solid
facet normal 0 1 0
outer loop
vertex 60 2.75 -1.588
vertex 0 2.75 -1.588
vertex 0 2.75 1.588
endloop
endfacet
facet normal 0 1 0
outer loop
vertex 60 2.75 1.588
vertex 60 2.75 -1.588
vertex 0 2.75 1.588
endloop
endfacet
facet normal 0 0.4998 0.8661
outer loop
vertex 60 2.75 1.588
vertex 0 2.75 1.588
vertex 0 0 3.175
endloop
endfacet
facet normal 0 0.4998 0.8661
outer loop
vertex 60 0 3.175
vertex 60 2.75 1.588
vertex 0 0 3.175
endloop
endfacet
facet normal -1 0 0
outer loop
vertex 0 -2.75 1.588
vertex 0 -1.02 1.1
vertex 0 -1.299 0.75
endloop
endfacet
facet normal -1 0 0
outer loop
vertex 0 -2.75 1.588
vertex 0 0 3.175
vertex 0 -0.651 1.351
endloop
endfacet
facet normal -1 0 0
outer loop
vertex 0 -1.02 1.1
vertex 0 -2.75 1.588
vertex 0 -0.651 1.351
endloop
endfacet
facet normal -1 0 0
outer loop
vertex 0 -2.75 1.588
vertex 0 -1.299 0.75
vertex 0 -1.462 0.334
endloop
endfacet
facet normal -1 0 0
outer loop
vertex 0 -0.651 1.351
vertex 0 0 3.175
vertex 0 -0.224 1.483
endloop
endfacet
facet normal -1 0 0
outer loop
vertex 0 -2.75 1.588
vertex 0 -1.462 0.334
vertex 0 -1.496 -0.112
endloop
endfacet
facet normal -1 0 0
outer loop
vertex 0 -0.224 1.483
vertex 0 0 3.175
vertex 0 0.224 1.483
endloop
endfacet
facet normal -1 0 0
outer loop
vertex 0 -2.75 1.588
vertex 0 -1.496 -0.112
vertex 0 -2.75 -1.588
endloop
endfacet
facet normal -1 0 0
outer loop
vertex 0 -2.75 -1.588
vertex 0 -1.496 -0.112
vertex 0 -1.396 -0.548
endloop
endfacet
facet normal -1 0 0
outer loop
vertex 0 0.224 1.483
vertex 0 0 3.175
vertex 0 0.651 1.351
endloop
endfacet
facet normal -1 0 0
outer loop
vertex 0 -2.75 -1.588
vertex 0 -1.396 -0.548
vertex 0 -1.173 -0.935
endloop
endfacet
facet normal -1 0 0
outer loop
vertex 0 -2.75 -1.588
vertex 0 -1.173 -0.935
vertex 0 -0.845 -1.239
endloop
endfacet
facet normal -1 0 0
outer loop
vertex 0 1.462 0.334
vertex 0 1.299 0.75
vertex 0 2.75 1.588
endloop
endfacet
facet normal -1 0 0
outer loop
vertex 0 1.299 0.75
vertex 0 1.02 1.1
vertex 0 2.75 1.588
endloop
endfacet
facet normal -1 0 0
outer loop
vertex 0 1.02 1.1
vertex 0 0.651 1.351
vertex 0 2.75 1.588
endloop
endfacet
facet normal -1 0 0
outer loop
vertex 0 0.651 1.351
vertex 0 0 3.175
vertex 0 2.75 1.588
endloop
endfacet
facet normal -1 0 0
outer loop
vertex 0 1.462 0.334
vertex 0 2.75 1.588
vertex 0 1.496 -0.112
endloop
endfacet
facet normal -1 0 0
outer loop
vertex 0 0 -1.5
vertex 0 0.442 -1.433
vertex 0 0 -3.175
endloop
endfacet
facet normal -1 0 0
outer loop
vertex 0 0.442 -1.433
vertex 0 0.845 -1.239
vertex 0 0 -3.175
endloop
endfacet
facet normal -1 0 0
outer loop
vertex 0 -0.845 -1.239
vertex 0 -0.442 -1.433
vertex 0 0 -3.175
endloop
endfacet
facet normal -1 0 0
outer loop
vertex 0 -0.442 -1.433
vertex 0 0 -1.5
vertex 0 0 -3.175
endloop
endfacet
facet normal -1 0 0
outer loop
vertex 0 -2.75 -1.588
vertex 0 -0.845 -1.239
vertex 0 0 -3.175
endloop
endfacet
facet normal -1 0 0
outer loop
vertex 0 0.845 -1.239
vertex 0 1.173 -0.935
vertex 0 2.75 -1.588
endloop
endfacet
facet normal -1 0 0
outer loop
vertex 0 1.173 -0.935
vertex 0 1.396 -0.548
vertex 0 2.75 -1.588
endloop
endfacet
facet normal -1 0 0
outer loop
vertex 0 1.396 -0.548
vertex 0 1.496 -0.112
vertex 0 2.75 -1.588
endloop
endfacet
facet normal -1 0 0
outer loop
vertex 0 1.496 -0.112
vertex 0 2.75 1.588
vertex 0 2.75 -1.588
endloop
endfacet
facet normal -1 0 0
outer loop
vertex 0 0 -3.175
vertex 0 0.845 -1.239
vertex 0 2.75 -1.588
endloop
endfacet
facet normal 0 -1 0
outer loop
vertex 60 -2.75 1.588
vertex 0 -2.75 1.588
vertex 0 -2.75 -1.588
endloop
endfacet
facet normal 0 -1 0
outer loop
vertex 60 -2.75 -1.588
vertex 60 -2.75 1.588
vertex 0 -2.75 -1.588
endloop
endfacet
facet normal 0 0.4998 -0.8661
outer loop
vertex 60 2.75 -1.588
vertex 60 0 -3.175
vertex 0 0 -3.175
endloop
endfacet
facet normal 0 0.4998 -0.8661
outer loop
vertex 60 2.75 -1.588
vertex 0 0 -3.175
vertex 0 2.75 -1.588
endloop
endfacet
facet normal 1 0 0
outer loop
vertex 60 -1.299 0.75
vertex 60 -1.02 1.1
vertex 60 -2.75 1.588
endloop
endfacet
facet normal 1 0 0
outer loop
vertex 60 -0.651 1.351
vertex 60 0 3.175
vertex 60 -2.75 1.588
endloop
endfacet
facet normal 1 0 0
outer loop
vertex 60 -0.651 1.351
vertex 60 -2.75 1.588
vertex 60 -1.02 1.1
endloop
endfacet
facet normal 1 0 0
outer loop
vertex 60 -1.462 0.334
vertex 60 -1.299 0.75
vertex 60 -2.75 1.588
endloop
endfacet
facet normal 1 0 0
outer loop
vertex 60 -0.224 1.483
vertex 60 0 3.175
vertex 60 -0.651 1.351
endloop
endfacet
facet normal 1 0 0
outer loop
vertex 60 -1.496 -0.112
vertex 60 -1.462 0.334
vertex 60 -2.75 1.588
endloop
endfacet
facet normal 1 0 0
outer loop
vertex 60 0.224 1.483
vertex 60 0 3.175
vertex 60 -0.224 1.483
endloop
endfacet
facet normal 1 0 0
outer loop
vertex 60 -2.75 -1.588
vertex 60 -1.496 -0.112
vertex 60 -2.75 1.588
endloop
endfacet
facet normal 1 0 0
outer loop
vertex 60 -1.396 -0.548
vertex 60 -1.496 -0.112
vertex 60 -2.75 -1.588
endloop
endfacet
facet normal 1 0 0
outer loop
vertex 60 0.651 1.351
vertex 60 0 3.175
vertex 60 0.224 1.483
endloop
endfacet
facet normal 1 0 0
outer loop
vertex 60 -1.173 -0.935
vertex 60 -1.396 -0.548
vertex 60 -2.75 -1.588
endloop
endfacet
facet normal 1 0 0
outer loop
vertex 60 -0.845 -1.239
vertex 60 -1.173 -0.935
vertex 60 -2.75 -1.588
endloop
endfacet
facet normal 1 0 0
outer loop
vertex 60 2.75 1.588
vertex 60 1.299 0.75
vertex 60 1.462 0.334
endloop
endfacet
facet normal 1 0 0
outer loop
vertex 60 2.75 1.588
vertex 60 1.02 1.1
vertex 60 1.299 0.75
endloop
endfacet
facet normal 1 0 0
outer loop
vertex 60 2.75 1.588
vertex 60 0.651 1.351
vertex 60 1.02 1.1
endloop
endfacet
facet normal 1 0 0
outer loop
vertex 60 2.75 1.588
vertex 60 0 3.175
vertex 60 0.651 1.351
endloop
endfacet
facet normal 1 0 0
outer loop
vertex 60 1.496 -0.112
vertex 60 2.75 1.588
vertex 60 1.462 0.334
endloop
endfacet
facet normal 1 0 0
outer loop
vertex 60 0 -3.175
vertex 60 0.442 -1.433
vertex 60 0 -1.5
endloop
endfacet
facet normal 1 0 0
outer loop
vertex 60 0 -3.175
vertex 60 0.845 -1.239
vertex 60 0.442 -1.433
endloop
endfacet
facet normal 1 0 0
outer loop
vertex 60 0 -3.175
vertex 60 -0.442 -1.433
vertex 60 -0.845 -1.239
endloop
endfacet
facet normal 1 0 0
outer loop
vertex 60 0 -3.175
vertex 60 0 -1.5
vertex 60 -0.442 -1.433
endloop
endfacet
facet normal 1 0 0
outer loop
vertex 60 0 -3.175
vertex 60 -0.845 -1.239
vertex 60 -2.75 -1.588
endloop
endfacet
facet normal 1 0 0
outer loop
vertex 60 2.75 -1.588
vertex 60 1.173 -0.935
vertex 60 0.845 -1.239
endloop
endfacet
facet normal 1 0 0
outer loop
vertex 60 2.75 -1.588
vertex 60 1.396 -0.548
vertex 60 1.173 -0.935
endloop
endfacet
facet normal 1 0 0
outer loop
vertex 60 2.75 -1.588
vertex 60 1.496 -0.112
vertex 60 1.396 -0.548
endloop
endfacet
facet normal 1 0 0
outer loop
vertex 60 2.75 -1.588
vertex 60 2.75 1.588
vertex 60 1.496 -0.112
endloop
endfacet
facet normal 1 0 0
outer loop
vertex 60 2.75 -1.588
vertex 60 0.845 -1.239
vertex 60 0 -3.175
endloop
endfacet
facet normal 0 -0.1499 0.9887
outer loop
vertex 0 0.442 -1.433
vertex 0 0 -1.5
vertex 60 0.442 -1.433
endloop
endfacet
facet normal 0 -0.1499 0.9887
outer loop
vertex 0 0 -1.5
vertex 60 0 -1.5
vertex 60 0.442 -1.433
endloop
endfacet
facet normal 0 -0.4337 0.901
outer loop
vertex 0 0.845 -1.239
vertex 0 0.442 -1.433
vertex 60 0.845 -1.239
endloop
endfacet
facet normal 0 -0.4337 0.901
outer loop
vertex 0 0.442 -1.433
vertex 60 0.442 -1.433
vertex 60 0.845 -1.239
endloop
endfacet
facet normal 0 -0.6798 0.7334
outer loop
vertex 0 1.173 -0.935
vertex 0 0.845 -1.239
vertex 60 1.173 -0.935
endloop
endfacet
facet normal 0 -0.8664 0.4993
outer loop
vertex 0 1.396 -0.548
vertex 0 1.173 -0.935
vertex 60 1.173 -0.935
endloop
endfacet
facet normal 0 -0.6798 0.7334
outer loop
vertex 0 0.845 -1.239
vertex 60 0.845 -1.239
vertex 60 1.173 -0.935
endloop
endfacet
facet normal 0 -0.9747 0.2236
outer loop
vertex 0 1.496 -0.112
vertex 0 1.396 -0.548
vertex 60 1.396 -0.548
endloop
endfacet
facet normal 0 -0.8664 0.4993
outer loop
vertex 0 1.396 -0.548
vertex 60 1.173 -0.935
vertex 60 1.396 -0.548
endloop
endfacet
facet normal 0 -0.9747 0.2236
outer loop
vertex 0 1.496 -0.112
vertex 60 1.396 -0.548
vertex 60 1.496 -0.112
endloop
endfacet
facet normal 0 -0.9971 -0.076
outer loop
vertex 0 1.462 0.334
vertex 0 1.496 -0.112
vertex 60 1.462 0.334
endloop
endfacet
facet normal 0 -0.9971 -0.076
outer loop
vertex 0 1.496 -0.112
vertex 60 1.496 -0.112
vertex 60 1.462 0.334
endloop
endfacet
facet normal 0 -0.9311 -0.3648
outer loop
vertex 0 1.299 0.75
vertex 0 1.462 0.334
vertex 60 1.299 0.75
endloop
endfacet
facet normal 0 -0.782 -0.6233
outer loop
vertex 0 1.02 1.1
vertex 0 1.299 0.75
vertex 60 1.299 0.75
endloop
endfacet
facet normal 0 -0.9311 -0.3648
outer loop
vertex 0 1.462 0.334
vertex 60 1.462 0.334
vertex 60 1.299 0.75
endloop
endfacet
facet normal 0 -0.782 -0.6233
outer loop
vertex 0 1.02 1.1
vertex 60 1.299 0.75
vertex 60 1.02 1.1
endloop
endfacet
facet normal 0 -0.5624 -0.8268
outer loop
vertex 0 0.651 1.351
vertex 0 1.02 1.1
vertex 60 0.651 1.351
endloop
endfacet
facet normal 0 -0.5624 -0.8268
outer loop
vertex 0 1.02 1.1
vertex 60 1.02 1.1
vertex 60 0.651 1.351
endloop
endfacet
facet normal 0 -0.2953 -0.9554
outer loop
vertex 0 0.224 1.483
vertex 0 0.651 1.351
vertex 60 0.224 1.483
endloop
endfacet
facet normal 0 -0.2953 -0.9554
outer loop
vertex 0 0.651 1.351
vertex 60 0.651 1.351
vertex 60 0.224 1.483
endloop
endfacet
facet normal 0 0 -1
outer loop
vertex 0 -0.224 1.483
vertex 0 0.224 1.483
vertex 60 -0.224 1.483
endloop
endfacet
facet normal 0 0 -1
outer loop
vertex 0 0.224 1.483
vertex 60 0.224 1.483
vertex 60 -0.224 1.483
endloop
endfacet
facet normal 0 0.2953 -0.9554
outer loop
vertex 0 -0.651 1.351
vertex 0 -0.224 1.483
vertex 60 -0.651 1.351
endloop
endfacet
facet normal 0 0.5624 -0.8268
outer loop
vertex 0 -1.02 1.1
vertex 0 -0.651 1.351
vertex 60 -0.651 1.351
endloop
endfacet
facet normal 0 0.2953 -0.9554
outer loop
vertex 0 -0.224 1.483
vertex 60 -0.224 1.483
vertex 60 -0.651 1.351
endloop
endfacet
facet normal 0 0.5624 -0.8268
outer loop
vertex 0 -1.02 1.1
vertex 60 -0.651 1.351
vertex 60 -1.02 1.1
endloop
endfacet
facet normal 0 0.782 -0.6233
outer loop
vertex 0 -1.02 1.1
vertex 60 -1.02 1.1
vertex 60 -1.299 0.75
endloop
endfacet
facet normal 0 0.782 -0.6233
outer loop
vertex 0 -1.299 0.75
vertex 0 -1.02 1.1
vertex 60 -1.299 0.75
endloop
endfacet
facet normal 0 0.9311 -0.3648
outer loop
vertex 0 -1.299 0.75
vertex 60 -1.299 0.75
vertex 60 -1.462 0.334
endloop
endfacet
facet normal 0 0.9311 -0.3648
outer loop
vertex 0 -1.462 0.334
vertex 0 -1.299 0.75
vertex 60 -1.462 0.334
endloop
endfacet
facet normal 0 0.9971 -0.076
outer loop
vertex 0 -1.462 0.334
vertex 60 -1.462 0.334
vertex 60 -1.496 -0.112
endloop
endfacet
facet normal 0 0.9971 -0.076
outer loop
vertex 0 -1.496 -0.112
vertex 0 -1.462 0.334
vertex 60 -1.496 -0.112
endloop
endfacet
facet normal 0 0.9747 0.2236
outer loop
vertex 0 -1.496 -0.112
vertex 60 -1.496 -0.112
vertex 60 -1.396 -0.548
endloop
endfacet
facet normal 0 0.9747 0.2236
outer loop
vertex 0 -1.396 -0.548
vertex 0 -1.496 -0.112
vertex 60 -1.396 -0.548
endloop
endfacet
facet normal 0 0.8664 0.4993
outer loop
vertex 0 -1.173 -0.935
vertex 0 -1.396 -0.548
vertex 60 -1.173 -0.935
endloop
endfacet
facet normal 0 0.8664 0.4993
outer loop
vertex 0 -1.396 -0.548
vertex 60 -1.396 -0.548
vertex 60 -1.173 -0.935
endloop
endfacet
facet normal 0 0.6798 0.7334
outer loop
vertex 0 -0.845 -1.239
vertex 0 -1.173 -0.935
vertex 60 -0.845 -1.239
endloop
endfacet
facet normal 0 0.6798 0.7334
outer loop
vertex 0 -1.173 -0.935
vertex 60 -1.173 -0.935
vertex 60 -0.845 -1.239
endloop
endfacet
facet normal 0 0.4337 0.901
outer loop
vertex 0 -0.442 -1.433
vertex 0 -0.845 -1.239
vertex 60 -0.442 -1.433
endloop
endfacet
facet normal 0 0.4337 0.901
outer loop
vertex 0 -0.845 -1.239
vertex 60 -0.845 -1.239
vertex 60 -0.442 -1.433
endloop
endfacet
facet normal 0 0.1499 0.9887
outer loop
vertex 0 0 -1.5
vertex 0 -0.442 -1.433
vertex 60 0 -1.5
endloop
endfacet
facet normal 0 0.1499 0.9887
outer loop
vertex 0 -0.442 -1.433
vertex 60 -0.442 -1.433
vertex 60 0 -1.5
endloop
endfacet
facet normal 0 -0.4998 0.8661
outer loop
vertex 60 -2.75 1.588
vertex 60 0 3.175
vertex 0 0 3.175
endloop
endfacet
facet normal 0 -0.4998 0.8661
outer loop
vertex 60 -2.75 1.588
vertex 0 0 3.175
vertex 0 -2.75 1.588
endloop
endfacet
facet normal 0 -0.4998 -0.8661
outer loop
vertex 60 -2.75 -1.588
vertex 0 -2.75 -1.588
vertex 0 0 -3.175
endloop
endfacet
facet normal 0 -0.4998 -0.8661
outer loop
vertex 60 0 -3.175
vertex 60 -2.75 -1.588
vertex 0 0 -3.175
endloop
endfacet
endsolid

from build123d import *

# Parameters (mm, degrees)
HEX_2_DEPTH   = 60
BORE_SKETCH_W = 62
BORE_SKETCH_H = 1.5


with BuildPart() as part:
    # Hex Sketch → Hex 2 (new body)
    with BuildSketch(Plane(origin=(0, 0, 0), x_dir=(0, 0, -1), z_dir=(1, 0, 0))):
        Polygon((3.175426481, 0), (1.58771324, 2.75), (-1.58771324, 2.75), (-3.175426481, 0), (-1.58771324, -2.75), (1.58771324, -2.75), align=None)
    extrude(amount=HEX_2_DEPTH)

    # Bore Sketch → Bore (revolve, cut)
    with BuildSketch(Plane.XY):
        with Locations((30, 0.75)):
            Rectangle(BORE_SKETCH_W, BORE_SKETCH_H)
    revolve(axis=Axis((-400, 0, 0), (1, 0, 0)), mode=Mode.SUBTRACT)


solid = part.part
